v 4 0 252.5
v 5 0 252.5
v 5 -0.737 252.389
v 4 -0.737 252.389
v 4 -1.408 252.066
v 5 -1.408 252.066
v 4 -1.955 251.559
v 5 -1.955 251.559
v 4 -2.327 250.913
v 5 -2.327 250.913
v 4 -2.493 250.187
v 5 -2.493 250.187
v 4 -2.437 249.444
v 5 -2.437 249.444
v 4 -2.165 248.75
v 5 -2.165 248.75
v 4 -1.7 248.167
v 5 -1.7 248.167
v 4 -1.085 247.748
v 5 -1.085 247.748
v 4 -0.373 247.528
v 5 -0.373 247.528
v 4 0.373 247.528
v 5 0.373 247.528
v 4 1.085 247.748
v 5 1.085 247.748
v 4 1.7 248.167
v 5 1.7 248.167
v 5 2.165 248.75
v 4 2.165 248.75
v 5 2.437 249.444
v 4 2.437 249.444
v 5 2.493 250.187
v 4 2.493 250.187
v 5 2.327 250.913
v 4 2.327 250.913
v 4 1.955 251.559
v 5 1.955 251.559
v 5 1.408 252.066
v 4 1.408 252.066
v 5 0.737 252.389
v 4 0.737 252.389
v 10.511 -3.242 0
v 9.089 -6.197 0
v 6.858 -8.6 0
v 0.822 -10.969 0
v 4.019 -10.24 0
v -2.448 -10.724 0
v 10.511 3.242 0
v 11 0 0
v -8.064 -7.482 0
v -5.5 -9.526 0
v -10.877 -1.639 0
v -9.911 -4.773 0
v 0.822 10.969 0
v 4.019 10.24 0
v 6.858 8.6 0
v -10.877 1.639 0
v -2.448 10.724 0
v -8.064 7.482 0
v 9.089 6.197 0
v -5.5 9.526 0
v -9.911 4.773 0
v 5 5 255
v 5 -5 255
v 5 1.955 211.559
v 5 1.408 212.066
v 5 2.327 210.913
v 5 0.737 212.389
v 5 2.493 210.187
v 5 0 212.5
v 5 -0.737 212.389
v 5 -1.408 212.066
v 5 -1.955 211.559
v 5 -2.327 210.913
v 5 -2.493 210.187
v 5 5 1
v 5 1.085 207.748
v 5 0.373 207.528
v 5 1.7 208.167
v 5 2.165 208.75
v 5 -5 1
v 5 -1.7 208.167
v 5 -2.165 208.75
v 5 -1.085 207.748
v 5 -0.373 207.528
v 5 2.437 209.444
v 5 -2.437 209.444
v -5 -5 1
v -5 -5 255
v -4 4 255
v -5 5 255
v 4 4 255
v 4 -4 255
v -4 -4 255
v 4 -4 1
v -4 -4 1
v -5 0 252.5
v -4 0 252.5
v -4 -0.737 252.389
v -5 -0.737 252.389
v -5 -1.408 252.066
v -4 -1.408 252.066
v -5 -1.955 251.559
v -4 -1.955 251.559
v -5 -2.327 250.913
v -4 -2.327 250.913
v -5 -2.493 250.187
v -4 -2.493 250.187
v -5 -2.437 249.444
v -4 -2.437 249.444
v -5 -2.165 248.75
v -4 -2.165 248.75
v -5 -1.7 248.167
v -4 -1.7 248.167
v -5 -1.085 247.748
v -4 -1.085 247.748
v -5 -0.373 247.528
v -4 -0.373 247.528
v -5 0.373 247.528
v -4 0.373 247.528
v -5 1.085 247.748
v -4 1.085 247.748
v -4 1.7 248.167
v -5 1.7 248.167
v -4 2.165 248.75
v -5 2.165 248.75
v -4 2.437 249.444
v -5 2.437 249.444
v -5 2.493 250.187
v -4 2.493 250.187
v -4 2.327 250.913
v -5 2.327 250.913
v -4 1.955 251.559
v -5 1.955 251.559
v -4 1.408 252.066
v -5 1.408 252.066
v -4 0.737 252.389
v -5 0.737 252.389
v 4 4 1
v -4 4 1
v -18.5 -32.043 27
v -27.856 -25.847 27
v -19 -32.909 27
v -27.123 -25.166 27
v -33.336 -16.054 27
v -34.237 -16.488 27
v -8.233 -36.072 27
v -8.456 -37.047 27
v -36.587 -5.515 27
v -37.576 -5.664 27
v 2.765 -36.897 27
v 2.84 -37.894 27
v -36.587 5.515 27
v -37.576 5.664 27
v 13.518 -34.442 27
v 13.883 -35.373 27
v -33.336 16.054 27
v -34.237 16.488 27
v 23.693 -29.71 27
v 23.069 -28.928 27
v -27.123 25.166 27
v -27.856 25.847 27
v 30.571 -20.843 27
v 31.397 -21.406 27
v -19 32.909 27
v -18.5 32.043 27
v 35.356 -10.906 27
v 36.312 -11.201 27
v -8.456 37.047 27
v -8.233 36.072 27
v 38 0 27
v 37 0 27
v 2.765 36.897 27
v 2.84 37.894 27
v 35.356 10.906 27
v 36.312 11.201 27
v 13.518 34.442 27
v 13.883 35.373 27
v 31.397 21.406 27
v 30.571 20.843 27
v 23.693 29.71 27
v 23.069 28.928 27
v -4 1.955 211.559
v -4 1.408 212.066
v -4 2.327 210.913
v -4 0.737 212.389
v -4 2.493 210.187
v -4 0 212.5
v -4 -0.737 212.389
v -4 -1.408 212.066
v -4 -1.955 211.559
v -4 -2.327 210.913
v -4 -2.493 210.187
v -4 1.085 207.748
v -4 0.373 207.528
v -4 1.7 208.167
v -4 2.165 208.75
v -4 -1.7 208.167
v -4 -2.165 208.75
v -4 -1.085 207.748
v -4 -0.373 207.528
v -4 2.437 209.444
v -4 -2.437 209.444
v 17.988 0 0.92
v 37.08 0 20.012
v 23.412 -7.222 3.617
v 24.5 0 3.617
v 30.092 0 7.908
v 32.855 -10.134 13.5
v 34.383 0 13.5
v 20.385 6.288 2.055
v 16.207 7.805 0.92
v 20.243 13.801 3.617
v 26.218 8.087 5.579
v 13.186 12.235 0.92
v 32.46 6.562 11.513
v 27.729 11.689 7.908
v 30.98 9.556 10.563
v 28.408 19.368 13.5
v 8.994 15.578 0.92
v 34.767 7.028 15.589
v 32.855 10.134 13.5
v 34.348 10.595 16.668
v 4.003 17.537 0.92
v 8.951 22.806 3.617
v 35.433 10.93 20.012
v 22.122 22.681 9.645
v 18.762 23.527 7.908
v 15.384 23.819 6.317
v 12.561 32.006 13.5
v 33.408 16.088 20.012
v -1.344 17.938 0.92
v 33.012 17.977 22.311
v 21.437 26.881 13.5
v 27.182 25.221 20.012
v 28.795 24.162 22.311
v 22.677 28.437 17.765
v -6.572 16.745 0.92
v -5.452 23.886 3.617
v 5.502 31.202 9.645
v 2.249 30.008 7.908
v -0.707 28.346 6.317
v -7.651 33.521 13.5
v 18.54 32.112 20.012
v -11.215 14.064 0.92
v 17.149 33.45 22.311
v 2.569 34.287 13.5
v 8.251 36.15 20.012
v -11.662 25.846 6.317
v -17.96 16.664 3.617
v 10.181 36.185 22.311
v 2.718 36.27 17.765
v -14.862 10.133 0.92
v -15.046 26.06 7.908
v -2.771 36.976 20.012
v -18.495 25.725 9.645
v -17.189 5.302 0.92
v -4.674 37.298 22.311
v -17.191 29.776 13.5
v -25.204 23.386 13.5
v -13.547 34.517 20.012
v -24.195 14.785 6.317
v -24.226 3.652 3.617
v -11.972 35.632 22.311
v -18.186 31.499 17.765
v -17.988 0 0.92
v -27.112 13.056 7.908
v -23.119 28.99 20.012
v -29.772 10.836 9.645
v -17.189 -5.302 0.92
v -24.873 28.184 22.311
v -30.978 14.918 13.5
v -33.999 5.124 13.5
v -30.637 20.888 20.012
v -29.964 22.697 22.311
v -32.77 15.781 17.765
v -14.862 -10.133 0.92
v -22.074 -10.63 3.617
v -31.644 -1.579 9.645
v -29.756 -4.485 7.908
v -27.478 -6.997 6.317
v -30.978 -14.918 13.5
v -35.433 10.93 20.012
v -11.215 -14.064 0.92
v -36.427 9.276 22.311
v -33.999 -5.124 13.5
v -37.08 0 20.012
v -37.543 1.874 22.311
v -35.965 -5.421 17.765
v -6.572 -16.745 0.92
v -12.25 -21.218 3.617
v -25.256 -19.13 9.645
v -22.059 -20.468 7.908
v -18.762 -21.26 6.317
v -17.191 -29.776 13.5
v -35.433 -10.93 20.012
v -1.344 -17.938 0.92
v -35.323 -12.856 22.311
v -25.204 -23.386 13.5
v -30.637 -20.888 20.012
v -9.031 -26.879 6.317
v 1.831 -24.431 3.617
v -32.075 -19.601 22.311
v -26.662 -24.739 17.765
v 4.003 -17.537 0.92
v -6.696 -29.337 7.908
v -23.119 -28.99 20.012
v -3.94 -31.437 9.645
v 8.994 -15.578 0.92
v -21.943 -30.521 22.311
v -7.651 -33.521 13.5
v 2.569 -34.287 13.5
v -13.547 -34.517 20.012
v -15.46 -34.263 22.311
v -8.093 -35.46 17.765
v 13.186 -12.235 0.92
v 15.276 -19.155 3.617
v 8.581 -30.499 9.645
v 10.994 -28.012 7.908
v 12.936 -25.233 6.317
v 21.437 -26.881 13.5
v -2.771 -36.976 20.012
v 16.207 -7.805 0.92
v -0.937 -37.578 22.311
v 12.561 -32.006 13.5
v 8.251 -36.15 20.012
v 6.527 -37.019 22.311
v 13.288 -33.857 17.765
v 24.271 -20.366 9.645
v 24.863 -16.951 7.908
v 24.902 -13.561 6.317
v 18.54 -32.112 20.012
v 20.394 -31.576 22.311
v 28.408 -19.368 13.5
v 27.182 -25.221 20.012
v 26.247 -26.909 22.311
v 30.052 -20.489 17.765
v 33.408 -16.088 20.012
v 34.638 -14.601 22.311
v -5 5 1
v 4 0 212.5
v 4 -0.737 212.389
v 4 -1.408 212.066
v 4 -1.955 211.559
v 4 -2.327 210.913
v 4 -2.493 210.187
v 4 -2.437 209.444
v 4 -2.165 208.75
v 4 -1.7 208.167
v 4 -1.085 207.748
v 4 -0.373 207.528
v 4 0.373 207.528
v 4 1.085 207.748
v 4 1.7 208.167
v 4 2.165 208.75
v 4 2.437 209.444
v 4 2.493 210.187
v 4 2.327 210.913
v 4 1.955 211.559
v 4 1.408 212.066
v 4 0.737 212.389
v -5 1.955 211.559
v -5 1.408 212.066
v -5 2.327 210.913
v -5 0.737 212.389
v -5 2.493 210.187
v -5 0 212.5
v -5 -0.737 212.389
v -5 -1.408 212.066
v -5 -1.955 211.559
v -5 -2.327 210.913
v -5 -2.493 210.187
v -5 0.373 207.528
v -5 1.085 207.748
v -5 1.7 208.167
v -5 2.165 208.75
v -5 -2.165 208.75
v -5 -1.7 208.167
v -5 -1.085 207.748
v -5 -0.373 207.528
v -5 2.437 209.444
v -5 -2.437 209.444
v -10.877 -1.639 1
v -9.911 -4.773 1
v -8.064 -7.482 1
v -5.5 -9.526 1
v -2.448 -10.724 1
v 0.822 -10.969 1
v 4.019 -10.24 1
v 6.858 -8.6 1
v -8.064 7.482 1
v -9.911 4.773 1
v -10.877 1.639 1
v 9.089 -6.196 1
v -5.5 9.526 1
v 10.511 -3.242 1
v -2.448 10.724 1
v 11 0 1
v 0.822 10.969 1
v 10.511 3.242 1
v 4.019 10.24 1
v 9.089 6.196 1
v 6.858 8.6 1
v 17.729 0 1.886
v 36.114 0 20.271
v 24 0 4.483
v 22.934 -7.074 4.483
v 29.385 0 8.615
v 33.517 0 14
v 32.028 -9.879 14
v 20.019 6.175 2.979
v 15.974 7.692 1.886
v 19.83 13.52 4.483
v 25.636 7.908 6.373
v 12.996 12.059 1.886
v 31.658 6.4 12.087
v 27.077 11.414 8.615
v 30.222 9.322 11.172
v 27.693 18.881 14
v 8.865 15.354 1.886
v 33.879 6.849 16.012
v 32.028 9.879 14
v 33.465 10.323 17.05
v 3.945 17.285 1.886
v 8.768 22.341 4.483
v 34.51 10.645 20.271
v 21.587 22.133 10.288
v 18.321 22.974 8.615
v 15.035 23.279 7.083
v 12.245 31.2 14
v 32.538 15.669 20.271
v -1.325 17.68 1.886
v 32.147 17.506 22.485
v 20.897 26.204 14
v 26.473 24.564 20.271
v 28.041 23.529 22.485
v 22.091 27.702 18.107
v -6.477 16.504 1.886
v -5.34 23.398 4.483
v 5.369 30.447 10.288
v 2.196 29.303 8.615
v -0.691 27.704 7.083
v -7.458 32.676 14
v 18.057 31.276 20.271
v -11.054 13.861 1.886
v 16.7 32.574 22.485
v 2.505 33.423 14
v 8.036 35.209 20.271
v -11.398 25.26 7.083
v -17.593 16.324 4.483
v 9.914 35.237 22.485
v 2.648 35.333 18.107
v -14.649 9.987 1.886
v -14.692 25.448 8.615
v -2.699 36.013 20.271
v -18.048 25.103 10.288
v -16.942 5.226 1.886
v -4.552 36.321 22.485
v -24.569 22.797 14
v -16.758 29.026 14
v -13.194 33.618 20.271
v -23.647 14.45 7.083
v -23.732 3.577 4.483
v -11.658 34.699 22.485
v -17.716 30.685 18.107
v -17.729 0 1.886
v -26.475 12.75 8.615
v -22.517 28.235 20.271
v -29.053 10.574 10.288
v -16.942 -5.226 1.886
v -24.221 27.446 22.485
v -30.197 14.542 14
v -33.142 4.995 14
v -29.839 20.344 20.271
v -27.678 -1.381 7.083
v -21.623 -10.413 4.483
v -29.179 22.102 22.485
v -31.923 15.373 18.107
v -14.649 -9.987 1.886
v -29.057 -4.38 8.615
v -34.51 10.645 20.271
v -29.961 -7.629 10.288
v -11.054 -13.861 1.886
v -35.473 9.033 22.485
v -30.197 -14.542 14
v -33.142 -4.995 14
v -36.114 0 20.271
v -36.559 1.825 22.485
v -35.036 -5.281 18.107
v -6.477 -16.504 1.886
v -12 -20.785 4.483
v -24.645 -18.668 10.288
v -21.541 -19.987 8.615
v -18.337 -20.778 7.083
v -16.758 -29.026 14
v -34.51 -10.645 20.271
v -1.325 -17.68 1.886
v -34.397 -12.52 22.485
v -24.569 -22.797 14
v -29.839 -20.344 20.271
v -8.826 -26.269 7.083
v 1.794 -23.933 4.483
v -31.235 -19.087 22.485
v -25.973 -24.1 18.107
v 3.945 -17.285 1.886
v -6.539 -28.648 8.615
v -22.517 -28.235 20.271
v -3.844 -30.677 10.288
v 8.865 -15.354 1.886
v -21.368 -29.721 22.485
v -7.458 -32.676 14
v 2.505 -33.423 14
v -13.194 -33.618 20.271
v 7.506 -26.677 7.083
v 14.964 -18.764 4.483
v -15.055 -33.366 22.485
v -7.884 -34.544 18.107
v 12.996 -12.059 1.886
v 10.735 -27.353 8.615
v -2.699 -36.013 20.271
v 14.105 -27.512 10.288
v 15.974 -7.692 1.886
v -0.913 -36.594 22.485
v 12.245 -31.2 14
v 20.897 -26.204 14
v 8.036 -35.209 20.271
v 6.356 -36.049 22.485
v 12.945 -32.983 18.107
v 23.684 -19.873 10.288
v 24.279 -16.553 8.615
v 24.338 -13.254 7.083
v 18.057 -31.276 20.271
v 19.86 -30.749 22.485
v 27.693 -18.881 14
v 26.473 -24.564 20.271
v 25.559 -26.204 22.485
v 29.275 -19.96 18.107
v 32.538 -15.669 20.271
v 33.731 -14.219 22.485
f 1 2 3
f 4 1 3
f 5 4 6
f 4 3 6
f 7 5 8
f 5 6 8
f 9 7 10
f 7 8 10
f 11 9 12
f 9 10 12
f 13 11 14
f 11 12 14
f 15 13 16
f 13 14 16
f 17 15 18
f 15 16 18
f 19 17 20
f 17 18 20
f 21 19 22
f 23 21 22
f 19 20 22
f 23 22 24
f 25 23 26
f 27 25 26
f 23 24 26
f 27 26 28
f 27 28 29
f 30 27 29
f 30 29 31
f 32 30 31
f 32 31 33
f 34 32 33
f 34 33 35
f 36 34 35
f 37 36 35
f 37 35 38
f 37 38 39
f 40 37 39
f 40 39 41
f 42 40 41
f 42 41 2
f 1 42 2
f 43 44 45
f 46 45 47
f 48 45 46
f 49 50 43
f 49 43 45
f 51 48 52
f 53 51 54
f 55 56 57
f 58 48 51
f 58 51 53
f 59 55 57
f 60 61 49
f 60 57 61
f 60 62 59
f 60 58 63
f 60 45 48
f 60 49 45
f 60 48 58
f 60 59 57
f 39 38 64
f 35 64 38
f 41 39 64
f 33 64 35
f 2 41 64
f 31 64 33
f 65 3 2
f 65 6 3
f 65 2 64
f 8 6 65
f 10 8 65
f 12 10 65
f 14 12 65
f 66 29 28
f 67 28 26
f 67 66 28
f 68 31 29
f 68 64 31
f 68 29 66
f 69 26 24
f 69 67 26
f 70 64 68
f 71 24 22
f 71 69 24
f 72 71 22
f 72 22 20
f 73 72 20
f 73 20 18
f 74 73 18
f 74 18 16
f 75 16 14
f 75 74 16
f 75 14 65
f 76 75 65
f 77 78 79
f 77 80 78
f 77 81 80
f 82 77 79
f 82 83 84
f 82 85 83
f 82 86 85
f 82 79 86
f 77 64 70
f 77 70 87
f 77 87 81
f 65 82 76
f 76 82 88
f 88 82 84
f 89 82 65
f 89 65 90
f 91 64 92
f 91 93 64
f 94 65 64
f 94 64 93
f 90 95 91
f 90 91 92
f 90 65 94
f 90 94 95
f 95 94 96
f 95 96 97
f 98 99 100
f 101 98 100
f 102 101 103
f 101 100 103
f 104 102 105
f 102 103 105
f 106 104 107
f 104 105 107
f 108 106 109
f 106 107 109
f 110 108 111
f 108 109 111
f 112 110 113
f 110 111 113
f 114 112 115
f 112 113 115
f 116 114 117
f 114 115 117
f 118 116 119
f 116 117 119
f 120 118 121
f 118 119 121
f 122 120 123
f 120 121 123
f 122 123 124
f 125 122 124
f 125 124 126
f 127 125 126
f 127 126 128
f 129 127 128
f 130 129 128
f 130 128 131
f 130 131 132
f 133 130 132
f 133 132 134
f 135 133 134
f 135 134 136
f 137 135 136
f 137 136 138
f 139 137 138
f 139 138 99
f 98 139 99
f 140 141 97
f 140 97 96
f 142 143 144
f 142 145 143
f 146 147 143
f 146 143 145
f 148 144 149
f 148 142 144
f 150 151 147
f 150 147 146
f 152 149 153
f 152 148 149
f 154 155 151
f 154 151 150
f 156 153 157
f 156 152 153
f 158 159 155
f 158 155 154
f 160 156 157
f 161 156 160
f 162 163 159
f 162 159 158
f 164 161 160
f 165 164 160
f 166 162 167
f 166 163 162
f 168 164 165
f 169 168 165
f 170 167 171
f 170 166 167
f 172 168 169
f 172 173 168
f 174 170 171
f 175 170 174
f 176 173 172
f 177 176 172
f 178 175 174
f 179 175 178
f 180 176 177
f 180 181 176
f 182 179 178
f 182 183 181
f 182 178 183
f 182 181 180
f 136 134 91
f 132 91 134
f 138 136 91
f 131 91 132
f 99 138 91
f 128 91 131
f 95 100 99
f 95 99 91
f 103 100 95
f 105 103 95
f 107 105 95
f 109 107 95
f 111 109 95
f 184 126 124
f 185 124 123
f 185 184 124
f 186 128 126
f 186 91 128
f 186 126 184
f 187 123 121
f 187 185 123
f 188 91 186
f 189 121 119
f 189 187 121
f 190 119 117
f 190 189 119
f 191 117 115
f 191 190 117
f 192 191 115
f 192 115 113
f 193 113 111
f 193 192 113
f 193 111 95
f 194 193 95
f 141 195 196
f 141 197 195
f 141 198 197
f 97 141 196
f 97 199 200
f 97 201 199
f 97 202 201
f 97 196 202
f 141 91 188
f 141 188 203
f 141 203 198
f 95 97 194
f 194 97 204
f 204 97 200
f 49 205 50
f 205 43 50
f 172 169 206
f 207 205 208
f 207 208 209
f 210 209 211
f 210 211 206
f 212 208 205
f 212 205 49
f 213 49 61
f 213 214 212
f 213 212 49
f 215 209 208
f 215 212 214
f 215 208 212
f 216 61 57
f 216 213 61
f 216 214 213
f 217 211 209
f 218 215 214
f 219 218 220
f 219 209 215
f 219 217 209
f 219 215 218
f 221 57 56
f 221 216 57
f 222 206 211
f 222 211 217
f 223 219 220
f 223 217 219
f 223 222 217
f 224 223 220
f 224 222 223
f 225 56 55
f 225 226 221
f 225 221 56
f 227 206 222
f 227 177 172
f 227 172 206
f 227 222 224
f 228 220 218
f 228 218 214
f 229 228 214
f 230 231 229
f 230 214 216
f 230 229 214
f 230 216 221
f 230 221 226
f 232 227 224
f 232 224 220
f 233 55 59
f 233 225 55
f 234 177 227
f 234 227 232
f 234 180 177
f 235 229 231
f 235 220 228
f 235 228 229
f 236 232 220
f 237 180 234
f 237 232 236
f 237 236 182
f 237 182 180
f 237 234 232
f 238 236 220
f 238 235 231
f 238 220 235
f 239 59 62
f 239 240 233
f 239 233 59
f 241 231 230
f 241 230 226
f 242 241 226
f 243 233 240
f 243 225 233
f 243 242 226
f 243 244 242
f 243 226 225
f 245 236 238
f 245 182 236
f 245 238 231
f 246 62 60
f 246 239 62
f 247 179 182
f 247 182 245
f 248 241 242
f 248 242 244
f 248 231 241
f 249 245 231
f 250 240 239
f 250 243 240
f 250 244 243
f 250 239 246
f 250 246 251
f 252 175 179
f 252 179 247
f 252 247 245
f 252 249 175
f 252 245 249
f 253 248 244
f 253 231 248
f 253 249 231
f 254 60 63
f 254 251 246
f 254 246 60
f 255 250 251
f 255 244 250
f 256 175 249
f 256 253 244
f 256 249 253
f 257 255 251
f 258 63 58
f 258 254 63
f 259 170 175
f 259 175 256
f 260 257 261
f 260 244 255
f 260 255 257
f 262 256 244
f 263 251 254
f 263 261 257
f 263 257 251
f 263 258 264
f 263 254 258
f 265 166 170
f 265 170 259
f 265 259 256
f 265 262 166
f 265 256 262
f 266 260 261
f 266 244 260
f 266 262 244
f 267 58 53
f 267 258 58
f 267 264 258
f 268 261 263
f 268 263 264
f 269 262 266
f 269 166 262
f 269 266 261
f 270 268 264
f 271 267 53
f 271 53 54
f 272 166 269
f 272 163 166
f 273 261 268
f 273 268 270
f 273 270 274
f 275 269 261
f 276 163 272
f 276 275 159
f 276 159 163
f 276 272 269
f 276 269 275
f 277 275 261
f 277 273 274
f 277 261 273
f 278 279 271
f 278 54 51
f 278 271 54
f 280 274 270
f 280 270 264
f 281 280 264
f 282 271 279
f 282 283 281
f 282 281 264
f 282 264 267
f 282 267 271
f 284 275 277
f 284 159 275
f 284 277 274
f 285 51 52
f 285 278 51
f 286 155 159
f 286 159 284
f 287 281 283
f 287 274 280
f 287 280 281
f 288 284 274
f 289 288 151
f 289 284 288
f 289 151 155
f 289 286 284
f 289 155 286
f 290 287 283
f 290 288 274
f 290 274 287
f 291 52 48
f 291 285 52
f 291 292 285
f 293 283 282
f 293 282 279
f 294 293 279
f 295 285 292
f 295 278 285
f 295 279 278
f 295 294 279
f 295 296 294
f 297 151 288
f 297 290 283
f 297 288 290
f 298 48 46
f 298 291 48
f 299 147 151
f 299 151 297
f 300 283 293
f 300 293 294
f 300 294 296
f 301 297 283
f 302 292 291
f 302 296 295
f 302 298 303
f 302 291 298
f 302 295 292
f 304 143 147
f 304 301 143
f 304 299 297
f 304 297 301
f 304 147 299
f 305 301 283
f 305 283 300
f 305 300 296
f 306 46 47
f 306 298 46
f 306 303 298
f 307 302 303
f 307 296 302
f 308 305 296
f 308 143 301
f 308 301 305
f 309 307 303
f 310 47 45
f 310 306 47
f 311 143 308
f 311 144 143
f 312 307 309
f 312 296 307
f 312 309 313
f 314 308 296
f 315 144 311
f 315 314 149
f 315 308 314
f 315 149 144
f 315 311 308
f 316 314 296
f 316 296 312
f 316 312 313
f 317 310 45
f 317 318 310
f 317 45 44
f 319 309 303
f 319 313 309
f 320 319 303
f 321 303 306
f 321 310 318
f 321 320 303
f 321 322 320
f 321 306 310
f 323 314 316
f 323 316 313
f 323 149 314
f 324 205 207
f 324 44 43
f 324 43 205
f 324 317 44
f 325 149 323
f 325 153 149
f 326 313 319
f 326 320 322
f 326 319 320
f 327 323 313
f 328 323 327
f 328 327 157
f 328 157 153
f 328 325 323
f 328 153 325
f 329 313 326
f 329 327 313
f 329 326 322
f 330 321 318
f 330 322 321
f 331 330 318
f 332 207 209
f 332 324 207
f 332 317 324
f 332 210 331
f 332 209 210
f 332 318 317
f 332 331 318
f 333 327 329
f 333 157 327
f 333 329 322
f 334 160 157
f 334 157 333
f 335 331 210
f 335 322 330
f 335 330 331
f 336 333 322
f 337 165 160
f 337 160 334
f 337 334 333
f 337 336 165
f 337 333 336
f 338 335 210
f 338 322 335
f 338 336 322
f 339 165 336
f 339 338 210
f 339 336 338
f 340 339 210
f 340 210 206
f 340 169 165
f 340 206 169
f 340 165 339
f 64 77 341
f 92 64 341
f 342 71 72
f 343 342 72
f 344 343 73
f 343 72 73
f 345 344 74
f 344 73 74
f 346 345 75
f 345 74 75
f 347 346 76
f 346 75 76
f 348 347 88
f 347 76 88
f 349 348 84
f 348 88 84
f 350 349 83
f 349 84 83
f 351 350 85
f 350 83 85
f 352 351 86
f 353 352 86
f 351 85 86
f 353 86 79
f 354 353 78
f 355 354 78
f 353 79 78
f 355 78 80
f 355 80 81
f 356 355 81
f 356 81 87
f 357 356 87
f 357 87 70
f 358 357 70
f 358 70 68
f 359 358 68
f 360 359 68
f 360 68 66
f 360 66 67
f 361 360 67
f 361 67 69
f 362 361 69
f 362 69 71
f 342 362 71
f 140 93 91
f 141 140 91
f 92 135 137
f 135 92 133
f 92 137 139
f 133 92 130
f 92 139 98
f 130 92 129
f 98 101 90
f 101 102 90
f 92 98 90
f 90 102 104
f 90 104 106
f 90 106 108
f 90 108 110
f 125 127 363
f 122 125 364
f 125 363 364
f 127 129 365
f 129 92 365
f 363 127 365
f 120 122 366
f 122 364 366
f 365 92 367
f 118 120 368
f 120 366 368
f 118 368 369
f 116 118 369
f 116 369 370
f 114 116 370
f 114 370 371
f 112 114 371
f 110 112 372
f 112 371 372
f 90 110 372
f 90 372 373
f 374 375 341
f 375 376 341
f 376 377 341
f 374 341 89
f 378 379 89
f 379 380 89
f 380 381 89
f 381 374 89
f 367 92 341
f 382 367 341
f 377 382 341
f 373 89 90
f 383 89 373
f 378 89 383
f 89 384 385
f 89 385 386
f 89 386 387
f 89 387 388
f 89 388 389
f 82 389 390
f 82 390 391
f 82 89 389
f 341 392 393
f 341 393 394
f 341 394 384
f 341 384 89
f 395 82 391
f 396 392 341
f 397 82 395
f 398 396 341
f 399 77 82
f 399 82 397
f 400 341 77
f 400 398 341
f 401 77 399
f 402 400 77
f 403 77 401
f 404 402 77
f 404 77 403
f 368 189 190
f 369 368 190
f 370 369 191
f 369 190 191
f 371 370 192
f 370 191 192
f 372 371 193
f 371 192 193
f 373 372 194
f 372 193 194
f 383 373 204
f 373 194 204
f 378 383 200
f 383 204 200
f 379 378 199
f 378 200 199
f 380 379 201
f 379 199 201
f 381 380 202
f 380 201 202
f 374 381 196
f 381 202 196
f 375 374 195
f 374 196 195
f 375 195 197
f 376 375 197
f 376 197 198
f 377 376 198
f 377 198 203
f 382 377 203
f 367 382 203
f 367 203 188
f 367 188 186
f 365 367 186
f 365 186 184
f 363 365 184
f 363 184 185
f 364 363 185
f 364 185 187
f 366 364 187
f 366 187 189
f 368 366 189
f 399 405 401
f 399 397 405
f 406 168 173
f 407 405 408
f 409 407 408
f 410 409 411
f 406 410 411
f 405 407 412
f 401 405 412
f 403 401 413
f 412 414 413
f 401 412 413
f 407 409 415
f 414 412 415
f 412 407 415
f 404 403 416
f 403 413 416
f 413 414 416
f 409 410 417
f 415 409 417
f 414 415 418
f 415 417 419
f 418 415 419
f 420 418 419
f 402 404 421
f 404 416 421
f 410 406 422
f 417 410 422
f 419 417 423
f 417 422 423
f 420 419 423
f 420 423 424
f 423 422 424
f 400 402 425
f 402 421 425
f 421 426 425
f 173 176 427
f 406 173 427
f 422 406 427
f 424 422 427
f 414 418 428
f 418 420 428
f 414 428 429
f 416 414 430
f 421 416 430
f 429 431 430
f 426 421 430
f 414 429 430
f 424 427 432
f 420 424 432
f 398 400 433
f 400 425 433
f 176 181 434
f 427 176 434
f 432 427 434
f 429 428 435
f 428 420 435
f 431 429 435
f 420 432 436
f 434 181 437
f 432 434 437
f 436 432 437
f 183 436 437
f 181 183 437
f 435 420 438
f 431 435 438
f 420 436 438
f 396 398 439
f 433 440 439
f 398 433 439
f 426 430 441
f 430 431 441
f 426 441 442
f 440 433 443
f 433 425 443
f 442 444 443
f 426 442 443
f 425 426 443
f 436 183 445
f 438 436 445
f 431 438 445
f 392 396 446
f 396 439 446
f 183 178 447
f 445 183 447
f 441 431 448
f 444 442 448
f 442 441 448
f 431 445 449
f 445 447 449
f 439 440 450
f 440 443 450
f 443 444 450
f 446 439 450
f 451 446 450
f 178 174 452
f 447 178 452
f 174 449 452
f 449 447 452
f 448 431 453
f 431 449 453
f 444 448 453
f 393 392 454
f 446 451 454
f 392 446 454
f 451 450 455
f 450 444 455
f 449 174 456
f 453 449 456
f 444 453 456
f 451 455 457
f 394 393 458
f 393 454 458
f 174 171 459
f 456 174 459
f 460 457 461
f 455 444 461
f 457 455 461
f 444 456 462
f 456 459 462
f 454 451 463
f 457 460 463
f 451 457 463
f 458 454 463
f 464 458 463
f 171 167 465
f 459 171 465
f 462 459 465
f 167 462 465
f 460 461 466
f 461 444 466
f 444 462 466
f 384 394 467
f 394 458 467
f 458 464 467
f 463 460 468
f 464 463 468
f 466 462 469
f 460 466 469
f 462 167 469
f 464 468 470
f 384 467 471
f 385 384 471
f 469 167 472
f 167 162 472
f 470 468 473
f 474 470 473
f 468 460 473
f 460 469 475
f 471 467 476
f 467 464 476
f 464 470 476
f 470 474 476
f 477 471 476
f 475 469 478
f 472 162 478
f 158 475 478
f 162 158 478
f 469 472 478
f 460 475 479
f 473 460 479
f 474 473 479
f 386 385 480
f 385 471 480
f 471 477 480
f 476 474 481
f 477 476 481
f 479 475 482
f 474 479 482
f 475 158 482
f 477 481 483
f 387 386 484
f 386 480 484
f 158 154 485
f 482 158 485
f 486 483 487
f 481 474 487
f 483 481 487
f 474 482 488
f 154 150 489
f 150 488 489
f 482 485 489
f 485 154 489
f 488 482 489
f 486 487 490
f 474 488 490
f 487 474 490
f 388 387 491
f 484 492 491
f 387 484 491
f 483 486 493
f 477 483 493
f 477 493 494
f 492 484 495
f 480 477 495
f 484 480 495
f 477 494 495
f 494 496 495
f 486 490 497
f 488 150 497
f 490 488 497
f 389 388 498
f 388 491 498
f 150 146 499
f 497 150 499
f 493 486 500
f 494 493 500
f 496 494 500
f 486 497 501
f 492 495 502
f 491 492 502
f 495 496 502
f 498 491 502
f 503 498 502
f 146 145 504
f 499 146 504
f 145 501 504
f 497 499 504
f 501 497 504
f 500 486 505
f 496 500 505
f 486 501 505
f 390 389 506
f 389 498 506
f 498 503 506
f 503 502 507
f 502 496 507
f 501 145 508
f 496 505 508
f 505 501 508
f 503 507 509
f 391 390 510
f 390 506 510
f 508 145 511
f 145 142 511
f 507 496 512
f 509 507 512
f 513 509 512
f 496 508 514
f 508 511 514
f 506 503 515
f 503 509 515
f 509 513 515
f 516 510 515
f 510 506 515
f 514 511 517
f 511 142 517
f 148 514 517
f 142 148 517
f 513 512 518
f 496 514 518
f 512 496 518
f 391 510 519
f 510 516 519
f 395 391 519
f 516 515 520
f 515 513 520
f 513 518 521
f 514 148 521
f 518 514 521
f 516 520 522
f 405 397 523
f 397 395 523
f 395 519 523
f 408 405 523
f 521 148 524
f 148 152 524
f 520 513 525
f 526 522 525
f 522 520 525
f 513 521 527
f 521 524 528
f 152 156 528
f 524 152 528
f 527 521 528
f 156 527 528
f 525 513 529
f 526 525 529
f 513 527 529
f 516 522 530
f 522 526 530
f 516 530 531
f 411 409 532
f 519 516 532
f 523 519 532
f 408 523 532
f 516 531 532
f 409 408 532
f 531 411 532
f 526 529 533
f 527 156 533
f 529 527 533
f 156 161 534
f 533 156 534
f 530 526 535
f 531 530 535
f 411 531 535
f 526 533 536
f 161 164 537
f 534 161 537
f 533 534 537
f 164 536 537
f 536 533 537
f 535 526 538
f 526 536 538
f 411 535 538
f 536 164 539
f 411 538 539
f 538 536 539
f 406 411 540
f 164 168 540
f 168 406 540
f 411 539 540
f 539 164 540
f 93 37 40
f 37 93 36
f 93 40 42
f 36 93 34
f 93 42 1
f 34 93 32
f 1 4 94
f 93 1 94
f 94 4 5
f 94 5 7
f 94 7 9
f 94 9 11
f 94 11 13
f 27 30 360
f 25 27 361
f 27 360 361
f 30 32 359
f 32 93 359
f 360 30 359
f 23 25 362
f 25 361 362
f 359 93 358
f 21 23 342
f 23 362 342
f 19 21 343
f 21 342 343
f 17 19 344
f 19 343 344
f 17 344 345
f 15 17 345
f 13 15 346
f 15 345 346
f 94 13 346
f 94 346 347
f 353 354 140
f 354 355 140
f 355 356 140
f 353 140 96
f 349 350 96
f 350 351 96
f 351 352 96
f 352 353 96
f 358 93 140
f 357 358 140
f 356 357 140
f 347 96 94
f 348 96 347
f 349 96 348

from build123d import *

# Parameters (mm, degrees)
SKETCH001_W   = 10
SKETCH001_H   = 10
SKETCH001_W_2 = 8
SKETCH001_H_2 = 8
PAD_DEPTH     = 254
SKETCH002_R   = 2.5
POCKET_DEPTH  = 43.001


with BuildPart() as part:
    # Sketch → Revolution (revolve)
    with BuildSketch(Plane.XZ):
        with BuildLine():
            Line((0, 0), (11, 0))
            ThreePointArc((11, 0), (30.091883, 7.908117), (38, 27))
            Line((38, 27), (37, 27))
            ThreePointArc((10.999947, 1), (29.384758, 8.615205), (37, 27))
            Line((10.999947, 1), (0, 1))
            Line((0, 0), (0, 1))
        make_face()
    revolve(axis=Axis((0, 0, 0), (0, 0, 1)))

    # Sketch001 (on Face5 of Revolution) → Pad (new body)
    with BuildSketch(Plane(origin=(0, 0, 1), x_dir=(-1, 0, 0), z_dir=(0, 0, 1))):
        Rectangle(SKETCH001_W, SKETCH001_H)
        Rectangle(SKETCH001_W_2, SKETCH001_H_2, mode=Mode.SUBTRACT)
    extrude(amount=PAD_DEPTH)

    # Sketch002 (on Face9 of Pad) → Pocket (cut, through all)
    with BuildSketch(Plane(origin=(5, 0, 0), x_dir=(0, 0, 1), z_dir=(1, 0, 0))):
        with Locations((250, 0)):
            Circle(SKETCH002_R)
        with Locations((210, 0)):
            Circle(SKETCH002_R)
    extrude(amount=-POCKET_DEPTH, mode=Mode.SUBTRACT)


solid = part.part
